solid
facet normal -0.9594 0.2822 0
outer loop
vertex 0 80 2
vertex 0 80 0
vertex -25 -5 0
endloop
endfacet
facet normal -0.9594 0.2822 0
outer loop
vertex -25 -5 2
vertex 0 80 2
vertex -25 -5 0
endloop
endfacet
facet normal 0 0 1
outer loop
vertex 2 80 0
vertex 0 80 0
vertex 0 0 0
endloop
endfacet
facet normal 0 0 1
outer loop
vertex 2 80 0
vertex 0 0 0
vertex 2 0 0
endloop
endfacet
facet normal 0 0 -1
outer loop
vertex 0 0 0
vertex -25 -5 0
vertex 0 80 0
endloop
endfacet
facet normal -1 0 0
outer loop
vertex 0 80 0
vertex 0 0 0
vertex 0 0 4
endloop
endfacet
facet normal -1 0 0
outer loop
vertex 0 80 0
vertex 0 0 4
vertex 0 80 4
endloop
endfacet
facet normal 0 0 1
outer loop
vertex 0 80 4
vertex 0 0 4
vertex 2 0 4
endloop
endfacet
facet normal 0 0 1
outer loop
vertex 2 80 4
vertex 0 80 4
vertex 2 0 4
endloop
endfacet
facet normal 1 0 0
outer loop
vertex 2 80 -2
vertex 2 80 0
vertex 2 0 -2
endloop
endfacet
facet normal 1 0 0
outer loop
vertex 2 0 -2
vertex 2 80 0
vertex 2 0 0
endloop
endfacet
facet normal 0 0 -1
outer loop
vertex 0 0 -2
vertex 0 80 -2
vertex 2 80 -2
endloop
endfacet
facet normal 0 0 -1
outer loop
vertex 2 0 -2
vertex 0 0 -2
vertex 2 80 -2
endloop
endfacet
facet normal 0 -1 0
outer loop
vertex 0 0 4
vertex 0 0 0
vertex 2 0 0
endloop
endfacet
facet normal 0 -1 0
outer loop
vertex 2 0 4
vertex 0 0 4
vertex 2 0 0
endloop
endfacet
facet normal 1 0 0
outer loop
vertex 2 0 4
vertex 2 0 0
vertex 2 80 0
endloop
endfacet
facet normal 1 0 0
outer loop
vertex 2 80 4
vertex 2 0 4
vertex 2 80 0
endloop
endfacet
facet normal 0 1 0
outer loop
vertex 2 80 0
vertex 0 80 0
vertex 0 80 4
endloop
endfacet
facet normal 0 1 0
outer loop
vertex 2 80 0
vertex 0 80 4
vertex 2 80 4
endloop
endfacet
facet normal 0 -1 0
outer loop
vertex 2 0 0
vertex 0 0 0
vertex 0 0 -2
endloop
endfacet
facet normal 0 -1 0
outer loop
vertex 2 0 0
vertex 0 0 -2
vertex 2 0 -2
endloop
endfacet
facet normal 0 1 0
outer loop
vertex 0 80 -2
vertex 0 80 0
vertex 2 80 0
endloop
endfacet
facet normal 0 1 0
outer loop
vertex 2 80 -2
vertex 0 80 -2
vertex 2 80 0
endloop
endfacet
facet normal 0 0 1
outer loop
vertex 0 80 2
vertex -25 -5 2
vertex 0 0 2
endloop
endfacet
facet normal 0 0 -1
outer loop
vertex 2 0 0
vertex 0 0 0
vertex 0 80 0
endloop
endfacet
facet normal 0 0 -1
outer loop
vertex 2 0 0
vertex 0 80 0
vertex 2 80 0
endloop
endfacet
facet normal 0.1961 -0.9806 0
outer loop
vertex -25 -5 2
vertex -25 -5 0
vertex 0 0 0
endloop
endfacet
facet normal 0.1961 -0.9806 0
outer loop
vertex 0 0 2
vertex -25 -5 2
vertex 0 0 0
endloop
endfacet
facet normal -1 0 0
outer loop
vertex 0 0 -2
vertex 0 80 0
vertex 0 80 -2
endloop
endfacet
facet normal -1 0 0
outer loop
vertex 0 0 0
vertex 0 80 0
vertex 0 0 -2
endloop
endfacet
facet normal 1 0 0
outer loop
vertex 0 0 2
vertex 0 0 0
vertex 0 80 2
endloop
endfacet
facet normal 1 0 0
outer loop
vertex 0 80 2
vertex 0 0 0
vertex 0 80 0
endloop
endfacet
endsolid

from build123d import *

# Parameters (mm, degrees)
F1_DEPTH  = 2
F2_W      = 2
F2_H      = 80
F3_DEPTH  = 2
F3_FACE_W = 2
F3_FACE_H = 80
F4_DEPTH  = 4


with BuildPart() as f1:
    # F0 (on Top) → F1 (new body)
    with BuildSketch(Plane.XY):
        Polygon((-25, -5), (0, 0), (0, 80), align=None)
    extrude(amount=F1_DEPTH)


with BuildPart() as f3:
    # F2 (on face) → F3 (new body)
    with BuildSketch(Plane(origin=(0, 0, 0), x_dir=(1, 0, 0), z_dir=(0, 0, -1))):
        with Locations((1, -40)):
            Rectangle(F2_W, F2_H)
    extrude(amount=F3_DEPTH)


with BuildPart() as f4:
    # F3_face (on face) → F4 (new body)
    with BuildSketch(Plane(origin=(1, 40, 0), x_dir=(1, 0, 0), z_dir=(0, 0, 1))):
        Rectangle(F3_FACE_W, F3_FACE_H)
    extrude(amount=F4_DEPTH)


solid = Compound([f1.part, f3.part, f4.part])
